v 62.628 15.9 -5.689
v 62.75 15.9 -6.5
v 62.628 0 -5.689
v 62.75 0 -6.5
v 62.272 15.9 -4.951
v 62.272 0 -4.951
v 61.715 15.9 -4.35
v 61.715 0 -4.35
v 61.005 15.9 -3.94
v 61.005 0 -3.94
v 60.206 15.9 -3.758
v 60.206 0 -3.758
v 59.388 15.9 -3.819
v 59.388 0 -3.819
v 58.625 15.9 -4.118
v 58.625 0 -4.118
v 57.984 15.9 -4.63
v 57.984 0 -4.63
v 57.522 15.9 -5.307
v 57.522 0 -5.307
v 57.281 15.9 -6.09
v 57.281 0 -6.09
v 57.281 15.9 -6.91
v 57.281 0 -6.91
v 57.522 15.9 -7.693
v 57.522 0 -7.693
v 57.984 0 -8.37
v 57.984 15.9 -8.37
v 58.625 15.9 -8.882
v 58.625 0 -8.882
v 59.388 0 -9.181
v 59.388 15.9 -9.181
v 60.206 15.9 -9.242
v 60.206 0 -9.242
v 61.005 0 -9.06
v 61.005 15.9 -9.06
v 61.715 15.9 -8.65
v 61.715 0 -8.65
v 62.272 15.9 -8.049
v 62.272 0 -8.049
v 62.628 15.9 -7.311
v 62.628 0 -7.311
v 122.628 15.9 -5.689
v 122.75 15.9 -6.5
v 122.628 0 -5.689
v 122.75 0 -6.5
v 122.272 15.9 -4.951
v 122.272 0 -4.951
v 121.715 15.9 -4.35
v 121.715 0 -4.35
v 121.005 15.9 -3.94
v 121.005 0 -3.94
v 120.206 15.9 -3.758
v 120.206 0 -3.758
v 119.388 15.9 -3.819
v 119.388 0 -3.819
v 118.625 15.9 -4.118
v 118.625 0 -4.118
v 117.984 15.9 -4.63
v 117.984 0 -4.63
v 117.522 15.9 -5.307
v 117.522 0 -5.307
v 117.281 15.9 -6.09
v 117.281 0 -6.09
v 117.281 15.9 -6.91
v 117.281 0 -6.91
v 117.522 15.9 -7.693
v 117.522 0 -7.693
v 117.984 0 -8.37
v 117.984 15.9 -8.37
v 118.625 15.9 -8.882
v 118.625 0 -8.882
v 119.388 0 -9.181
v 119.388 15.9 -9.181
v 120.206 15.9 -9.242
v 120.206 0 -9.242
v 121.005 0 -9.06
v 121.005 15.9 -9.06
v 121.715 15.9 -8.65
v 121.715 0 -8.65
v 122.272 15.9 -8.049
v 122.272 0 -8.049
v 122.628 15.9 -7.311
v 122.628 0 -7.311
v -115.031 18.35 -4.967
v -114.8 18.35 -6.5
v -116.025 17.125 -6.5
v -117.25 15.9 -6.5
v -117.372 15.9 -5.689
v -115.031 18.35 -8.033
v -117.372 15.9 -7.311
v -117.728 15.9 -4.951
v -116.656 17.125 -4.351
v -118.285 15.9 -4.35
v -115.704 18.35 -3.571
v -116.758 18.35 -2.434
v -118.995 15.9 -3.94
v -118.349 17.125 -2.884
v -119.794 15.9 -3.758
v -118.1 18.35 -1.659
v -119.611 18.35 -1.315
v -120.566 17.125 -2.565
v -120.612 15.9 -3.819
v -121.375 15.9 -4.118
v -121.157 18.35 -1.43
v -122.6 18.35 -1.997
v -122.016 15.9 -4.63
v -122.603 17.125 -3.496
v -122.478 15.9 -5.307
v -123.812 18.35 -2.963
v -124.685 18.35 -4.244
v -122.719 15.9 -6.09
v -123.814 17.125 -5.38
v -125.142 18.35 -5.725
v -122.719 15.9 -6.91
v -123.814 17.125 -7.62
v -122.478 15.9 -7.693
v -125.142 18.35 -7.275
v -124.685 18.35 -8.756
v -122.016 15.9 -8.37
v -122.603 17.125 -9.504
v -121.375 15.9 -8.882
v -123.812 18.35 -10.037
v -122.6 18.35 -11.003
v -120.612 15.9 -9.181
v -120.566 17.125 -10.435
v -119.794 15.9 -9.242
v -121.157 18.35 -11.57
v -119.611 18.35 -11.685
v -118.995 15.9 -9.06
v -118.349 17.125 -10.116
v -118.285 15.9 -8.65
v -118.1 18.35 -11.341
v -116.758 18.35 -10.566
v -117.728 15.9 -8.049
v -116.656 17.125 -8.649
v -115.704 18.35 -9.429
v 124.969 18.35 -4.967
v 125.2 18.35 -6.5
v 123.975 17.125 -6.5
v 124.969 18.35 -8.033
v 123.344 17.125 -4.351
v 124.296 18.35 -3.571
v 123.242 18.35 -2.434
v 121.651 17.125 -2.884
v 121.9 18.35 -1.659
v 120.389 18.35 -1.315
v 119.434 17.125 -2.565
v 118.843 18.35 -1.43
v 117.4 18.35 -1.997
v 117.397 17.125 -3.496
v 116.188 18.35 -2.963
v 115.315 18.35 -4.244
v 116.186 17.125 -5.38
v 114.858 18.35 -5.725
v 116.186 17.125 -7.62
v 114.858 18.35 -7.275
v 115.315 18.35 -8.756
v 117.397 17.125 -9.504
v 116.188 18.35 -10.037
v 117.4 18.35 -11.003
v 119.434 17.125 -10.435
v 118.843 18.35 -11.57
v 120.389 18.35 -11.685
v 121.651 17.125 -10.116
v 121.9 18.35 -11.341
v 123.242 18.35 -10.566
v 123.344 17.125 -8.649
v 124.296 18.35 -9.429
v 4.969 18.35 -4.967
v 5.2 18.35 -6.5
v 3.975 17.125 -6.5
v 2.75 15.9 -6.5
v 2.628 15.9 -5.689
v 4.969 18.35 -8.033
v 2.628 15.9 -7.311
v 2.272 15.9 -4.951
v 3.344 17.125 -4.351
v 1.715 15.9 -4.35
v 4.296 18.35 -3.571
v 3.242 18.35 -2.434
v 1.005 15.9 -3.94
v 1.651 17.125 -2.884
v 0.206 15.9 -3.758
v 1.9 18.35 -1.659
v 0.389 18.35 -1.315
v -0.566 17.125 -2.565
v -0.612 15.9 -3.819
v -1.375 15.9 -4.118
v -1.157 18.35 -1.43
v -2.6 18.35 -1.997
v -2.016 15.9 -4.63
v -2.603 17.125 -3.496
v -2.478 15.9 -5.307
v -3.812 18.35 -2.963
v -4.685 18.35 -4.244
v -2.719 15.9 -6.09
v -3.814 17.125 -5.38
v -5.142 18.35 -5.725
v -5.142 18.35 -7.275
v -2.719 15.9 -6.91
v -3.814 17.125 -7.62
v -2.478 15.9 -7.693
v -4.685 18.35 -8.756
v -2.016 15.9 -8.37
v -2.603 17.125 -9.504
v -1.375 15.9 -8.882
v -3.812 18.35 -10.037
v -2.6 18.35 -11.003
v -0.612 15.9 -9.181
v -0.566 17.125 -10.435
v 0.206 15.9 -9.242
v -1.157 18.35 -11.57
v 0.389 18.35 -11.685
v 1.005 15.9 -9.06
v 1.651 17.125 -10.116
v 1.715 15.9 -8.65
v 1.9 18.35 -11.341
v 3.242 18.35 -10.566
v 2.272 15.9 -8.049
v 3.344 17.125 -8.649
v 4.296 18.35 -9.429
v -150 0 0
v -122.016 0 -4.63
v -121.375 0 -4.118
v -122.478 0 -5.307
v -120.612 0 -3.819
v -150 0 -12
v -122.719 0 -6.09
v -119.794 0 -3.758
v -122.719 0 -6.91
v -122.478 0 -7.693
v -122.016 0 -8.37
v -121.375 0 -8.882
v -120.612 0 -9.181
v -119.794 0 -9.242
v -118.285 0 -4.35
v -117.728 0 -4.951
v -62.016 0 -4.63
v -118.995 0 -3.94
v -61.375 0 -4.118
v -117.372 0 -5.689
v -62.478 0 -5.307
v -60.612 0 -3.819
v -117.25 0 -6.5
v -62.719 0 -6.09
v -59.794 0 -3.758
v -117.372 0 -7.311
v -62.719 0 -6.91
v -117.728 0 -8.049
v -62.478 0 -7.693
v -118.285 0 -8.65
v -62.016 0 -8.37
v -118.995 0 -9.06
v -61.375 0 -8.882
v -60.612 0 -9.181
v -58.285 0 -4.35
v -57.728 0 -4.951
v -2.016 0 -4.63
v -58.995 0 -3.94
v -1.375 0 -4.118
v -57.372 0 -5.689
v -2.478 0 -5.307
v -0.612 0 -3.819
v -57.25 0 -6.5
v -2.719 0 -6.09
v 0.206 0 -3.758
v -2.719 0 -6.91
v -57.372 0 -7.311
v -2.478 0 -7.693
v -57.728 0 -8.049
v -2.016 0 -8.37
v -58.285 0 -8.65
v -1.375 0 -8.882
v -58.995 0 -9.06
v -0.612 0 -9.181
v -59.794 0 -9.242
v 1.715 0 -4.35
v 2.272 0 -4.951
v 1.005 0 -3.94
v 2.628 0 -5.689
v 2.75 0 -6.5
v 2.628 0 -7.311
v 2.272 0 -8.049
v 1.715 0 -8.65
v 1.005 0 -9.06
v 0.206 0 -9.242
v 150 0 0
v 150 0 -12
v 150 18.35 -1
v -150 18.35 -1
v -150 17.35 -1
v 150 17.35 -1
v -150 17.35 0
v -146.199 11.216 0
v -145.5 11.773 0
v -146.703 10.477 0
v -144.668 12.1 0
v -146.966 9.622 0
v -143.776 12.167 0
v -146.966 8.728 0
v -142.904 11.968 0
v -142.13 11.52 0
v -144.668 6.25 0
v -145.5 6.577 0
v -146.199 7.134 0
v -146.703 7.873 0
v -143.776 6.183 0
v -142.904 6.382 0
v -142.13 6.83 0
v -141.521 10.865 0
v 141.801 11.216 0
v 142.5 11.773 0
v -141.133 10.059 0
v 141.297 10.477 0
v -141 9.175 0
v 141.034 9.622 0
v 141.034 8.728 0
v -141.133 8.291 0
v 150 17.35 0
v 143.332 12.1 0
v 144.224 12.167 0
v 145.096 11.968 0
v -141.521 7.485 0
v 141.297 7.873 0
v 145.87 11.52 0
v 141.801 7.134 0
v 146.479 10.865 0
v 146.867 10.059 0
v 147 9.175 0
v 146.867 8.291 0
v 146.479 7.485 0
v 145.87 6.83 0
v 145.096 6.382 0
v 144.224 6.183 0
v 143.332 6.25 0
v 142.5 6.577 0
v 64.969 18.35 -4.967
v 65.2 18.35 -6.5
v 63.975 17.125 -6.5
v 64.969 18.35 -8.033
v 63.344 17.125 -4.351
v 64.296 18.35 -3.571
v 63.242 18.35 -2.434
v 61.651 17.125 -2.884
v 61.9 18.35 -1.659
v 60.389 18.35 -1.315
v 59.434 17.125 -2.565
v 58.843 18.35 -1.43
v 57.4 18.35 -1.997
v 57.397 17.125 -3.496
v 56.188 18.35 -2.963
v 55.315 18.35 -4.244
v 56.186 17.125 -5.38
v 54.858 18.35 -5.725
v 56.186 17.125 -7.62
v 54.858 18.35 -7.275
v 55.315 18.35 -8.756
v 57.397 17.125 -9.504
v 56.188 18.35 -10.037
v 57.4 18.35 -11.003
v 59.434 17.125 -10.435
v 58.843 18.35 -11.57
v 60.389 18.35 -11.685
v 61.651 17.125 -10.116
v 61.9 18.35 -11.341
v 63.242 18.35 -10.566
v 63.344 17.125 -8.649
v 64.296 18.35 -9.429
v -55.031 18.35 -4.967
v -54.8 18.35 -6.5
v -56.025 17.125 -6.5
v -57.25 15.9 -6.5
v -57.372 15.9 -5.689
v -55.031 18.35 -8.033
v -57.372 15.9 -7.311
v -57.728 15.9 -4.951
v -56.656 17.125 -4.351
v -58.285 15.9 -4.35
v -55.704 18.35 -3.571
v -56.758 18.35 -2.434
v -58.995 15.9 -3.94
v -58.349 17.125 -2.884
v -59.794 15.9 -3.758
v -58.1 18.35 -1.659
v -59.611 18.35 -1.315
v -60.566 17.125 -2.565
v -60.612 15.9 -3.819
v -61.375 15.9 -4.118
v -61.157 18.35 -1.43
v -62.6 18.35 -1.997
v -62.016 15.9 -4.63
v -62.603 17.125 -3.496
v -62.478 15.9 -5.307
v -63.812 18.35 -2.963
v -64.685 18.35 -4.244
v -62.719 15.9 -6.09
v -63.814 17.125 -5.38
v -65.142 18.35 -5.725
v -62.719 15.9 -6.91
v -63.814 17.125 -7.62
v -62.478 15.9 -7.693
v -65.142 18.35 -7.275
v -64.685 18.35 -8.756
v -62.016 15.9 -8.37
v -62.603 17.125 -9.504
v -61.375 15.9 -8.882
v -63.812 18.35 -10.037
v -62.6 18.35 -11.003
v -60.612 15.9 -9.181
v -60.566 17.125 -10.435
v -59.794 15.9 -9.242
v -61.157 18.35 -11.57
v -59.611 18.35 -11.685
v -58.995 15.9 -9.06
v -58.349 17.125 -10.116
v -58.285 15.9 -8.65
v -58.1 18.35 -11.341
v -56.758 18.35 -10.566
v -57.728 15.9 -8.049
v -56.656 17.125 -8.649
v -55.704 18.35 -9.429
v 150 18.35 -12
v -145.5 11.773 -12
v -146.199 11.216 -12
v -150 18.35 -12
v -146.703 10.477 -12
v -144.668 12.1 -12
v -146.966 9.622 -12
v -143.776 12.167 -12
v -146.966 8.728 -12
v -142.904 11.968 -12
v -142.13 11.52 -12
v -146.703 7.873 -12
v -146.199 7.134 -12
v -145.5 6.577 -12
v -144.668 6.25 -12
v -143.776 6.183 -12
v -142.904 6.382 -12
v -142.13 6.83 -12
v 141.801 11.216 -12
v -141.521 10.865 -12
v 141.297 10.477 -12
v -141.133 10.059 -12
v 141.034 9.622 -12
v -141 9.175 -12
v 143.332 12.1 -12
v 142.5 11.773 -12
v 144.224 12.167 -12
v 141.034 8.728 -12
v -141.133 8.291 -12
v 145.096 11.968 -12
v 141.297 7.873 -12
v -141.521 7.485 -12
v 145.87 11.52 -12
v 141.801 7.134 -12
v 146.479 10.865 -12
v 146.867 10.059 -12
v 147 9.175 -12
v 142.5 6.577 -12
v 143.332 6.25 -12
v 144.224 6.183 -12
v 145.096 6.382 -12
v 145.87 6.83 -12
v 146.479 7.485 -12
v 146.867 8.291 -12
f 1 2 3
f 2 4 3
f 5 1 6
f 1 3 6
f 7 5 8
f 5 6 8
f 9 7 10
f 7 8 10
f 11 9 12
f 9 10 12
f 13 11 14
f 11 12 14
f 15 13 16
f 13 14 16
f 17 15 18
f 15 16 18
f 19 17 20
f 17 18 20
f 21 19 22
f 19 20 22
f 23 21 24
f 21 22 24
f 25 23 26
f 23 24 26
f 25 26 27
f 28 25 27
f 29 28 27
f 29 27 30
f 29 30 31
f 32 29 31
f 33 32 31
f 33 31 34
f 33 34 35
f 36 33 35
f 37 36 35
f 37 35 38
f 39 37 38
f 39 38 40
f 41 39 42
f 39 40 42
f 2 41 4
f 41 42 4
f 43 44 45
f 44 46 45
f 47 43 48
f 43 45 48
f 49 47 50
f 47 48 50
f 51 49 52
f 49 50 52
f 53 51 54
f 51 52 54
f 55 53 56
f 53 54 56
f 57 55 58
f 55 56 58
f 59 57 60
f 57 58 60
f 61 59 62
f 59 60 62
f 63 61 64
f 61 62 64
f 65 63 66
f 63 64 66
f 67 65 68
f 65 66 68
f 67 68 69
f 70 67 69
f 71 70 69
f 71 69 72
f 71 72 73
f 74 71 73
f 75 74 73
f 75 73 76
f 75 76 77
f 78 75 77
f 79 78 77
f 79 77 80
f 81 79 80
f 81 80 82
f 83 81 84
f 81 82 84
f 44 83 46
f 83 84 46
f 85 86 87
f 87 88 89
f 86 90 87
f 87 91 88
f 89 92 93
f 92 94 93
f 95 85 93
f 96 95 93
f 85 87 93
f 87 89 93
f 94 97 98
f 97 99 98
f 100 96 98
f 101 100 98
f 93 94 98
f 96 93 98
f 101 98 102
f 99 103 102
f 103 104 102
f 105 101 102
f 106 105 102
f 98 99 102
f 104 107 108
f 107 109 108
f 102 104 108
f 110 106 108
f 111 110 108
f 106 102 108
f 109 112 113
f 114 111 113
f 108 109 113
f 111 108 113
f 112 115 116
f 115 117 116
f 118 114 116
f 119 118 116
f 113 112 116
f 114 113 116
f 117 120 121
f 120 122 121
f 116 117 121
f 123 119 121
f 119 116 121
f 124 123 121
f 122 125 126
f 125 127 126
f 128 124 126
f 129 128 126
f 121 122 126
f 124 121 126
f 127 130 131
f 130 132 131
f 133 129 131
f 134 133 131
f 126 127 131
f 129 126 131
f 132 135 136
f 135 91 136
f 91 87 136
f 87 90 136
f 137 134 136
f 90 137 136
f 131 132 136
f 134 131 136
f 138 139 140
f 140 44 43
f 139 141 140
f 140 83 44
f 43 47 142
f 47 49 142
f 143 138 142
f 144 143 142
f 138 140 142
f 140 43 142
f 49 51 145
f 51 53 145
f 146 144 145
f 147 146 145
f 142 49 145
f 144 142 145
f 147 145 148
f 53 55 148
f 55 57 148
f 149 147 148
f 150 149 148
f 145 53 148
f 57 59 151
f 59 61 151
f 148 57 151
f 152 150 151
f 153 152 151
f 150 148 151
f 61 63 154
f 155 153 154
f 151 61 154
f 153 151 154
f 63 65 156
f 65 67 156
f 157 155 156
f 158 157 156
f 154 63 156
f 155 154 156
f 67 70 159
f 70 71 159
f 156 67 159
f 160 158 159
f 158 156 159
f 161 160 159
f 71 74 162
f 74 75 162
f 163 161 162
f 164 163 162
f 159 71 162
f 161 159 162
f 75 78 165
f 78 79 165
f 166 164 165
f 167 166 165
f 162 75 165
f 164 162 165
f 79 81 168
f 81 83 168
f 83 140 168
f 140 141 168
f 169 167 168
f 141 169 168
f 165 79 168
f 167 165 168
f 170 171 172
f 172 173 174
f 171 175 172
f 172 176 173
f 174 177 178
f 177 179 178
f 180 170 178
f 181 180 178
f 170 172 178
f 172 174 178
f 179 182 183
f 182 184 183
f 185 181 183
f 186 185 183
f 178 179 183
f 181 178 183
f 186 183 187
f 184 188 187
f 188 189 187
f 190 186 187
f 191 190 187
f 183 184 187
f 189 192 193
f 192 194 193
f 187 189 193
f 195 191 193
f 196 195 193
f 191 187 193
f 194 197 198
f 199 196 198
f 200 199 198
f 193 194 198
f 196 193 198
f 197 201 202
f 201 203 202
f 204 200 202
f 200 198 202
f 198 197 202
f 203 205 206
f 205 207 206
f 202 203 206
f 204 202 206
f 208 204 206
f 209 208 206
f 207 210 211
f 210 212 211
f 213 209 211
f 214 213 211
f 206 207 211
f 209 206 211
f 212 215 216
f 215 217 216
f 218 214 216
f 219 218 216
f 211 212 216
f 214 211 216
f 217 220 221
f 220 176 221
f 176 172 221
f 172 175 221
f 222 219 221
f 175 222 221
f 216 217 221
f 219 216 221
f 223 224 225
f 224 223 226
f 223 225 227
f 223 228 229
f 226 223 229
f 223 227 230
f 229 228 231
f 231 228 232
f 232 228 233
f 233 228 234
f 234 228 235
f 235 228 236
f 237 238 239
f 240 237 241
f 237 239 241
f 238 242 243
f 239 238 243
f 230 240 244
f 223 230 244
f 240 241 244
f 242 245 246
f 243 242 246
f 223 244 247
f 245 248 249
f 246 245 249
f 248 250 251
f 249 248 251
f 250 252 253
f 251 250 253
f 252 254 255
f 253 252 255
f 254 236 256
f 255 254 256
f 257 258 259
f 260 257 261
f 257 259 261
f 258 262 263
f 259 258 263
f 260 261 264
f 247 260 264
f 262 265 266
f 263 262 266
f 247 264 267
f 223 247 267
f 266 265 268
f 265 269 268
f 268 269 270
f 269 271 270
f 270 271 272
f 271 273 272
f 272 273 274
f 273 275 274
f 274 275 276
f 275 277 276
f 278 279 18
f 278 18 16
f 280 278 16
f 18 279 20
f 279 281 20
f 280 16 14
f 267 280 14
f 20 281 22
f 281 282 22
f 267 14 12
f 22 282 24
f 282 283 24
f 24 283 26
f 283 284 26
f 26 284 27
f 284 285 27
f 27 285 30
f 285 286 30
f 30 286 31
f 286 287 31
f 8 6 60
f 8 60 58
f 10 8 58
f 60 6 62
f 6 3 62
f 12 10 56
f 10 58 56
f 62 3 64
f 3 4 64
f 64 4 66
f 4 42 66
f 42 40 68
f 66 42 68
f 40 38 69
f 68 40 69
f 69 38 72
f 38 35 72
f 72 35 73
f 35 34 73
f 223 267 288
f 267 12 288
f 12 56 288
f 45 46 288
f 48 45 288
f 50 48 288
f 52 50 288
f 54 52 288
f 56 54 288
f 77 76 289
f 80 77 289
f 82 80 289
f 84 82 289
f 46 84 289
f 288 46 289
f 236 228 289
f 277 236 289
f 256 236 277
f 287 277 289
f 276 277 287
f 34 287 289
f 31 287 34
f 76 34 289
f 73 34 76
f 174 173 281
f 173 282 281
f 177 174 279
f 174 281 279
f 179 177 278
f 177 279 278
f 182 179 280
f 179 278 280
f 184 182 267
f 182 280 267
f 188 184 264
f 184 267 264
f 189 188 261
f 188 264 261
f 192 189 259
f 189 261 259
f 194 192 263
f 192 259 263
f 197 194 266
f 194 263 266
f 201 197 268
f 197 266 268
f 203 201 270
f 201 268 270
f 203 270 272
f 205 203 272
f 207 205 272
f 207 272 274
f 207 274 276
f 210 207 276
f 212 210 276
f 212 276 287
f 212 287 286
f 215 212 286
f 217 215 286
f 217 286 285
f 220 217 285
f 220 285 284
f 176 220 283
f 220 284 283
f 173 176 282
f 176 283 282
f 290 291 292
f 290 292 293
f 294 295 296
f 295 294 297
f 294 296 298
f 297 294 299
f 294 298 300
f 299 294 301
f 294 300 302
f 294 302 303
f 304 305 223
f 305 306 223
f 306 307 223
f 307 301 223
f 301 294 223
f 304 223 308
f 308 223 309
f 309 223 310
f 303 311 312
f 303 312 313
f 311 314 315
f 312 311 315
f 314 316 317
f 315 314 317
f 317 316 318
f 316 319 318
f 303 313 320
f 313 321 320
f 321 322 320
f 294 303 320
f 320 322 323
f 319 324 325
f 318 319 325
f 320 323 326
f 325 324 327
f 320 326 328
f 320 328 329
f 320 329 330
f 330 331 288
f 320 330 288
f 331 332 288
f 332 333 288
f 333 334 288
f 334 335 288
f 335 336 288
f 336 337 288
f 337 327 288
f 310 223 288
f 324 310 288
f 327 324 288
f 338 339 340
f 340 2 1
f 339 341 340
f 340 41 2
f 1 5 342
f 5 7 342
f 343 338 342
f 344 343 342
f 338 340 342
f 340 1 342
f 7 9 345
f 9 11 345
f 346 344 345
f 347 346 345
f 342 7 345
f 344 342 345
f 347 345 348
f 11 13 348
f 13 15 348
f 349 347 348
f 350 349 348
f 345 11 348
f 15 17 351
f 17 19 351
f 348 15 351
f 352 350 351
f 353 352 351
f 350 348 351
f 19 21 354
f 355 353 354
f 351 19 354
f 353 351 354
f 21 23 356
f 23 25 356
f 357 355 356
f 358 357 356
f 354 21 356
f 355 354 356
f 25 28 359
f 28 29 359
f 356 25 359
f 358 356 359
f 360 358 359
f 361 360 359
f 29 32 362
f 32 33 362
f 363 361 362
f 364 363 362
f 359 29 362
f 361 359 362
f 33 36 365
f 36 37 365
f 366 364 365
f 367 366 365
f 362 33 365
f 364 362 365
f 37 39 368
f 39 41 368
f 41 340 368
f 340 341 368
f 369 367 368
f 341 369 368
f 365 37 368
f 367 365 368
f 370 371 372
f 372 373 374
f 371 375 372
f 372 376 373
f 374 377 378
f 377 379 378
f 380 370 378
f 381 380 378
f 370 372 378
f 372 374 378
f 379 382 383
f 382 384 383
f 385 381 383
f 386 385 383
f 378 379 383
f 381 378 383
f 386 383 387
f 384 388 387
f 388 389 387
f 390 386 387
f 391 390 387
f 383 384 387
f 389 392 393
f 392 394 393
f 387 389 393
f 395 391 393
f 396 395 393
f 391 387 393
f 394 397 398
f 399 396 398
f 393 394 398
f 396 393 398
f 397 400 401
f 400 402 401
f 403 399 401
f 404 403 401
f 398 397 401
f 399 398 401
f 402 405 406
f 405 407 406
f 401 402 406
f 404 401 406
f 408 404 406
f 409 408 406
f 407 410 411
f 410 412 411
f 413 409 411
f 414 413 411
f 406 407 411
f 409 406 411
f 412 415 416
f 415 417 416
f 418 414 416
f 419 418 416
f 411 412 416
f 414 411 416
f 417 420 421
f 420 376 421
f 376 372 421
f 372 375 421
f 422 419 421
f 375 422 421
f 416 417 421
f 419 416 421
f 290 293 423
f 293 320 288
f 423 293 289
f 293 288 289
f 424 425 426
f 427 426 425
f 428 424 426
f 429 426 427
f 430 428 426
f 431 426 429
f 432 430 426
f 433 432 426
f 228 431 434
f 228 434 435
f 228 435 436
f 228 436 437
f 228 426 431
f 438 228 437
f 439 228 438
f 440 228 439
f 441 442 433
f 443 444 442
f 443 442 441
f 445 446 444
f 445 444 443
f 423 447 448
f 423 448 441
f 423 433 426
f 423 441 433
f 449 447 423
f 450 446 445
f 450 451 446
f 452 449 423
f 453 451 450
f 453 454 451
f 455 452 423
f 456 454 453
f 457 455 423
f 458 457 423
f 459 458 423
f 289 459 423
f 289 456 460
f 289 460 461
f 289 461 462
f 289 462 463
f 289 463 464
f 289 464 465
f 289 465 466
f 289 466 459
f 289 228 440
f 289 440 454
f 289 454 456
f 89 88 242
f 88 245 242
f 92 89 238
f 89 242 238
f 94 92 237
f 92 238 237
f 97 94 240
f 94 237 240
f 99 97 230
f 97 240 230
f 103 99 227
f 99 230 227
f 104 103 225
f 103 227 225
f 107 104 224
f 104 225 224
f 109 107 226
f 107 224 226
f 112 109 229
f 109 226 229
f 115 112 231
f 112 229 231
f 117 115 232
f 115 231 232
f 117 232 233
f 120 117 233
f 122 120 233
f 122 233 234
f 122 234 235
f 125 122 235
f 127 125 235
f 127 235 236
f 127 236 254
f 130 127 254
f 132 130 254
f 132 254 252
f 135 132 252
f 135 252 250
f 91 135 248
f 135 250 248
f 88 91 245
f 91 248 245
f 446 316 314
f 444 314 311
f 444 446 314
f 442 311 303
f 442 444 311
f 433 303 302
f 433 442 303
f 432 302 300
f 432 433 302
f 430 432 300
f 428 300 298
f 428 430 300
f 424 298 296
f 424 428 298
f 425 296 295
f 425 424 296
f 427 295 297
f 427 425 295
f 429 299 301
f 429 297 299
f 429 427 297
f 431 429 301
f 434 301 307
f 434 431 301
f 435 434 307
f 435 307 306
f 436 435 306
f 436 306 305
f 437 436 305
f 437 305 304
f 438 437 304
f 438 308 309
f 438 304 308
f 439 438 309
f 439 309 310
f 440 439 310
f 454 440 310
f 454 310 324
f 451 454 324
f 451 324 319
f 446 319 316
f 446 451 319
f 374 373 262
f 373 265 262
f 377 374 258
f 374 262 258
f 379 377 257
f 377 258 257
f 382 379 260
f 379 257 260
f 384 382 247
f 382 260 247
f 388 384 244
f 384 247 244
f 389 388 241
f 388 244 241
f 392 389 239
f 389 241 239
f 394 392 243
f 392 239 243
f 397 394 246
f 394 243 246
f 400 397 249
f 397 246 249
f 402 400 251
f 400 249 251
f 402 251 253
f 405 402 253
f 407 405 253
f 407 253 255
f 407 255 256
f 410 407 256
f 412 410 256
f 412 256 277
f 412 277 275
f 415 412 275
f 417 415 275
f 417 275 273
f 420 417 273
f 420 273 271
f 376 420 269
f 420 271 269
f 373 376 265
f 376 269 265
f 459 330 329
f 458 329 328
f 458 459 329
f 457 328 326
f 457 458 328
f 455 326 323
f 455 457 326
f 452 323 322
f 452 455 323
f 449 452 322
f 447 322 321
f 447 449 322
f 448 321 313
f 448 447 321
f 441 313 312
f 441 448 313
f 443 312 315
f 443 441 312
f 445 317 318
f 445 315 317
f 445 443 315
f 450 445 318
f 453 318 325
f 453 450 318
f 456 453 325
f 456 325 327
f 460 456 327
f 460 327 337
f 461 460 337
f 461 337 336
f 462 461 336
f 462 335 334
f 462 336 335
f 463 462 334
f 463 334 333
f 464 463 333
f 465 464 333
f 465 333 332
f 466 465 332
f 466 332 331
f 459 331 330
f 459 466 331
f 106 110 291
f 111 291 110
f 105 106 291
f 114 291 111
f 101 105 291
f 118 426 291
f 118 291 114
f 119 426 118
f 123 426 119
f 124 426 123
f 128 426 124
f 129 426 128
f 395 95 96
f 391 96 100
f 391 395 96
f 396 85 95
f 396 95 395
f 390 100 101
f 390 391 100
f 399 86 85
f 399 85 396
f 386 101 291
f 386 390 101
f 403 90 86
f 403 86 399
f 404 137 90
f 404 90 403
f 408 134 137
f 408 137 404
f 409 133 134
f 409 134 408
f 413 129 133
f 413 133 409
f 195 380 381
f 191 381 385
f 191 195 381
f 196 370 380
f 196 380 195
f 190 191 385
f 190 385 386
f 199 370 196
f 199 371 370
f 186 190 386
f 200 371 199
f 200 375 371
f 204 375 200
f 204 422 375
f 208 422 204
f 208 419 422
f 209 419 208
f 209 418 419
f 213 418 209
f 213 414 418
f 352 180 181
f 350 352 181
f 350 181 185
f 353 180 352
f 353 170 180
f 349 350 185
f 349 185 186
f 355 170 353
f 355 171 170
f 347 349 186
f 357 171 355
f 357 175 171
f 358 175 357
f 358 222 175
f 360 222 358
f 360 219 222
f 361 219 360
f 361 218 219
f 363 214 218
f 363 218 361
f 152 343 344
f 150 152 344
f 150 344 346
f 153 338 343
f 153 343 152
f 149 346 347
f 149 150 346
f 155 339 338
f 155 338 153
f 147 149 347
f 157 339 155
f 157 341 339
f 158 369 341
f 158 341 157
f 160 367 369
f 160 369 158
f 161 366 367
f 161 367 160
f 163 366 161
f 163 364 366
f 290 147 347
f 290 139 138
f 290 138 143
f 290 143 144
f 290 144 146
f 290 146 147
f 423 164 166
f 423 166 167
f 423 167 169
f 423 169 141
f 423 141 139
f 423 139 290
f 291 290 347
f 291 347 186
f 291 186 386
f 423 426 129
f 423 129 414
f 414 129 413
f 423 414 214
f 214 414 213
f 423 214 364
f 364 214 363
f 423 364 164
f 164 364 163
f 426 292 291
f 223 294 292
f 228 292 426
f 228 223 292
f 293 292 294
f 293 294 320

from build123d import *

# Parameters (mm, degrees)
SKETCH_1_W                 = 300
SKETCH_1_H                 = 12
EXTRUDE_275_DEPTH          = 18.35
SKETCH_2_W                 = 300
SKETCH_2_H                 = 1
CUT_EXTRUDE_1_DEPTH        = 1
HOLE_WIZARD_M4_D           = 5.5
HOLE_WIZARD_M4_CSINK_D     = 10.4
HOLE_WIZARD_M4_CSINK_ANGLE = 90
PATTERN_LINEAR_1_COUNT     = 3
PATTERN_LINEAR_1_PITCH     = 60
PATTERN_LINEAR_1_COL_COUNT = 3
PATTERN_LINEAR_1_COL_PITCH = 60
SKETCH_5_R                 = 3
CUT_EXTRUDE_6_DEPTH        = 152.593939523


with BuildPart() as part:
    # Эскиз1 → Extrude 275 (new body)
    with BuildSketch(Plane(origin=(0, 0, 0), x_dir=(1, 0, 0), z_dir=(0, 1, 0))):
        with Locations((0, 6)):
            Rectangle(SKETCH_1_W, SKETCH_1_H)
    extrude(amount=EXTRUDE_275_DEPTH)

    # Эскиз2 → Вырез-Вытянуть1 (cut)
    with BuildSketch(Plane(origin=(0, 18.35, 0), x_dir=(1, 0, 0), z_dir=(0, 1, 0))):
        with Locations((0, 0.5)):
            Rectangle(SKETCH_2_W, SKETCH_2_H)
    extrude(amount=-CUT_EXTRUDE_1_DEPTH, mode=Mode.SUBTRACT)

    # Крепление-M4 (through all)
    with Locations(Plane(origin=(0, 18.35, 0), x_dir=(-1, 0, 0), z_dir=(0, 1, 0))):
        with Locations((0, -6.5)):
            hole_wizard_m4 = CounterSinkHole(HOLE_WIZARD_M4_D / 2, HOLE_WIZARD_M4_CSINK_D / 2, counter_sink_angle=HOLE_WIZARD_M4_CSINK_ANGLE)

    # Линейный массив1: Крепление-M4 ×3
    with Locations(*[(-i * PATTERN_LINEAR_1_PITCH, 0, 0) for i in range(1, PATTERN_LINEAR_1_COUNT)]):
        add(hole_wizard_m4, mode=Mode.SUBTRACT)

    # Линейный массив1 col: Крепление-M4 ×3
    with Locations(*[(i * PATTERN_LINEAR_1_COL_PITCH, 0, 0) for i in range(1, PATTERN_LINEAR_1_COL_COUNT)]):
        add(hole_wizard_m4, mode=Mode.SUBTRACT)

    # Эскиз5 → Валы-6мм (cut, through all)
    with BuildSketch(Plane.XY.offset(-12)):
        with Locations((-144, 9.175)):
            Circle(SKETCH_5_R)
        with Locations((144, 9.175)):
            Circle(SKETCH_5_R)
    extrude(amount=CUT_EXTRUDE_6_DEPTH, mode=Mode.SUBTRACT)


solid = part.part
